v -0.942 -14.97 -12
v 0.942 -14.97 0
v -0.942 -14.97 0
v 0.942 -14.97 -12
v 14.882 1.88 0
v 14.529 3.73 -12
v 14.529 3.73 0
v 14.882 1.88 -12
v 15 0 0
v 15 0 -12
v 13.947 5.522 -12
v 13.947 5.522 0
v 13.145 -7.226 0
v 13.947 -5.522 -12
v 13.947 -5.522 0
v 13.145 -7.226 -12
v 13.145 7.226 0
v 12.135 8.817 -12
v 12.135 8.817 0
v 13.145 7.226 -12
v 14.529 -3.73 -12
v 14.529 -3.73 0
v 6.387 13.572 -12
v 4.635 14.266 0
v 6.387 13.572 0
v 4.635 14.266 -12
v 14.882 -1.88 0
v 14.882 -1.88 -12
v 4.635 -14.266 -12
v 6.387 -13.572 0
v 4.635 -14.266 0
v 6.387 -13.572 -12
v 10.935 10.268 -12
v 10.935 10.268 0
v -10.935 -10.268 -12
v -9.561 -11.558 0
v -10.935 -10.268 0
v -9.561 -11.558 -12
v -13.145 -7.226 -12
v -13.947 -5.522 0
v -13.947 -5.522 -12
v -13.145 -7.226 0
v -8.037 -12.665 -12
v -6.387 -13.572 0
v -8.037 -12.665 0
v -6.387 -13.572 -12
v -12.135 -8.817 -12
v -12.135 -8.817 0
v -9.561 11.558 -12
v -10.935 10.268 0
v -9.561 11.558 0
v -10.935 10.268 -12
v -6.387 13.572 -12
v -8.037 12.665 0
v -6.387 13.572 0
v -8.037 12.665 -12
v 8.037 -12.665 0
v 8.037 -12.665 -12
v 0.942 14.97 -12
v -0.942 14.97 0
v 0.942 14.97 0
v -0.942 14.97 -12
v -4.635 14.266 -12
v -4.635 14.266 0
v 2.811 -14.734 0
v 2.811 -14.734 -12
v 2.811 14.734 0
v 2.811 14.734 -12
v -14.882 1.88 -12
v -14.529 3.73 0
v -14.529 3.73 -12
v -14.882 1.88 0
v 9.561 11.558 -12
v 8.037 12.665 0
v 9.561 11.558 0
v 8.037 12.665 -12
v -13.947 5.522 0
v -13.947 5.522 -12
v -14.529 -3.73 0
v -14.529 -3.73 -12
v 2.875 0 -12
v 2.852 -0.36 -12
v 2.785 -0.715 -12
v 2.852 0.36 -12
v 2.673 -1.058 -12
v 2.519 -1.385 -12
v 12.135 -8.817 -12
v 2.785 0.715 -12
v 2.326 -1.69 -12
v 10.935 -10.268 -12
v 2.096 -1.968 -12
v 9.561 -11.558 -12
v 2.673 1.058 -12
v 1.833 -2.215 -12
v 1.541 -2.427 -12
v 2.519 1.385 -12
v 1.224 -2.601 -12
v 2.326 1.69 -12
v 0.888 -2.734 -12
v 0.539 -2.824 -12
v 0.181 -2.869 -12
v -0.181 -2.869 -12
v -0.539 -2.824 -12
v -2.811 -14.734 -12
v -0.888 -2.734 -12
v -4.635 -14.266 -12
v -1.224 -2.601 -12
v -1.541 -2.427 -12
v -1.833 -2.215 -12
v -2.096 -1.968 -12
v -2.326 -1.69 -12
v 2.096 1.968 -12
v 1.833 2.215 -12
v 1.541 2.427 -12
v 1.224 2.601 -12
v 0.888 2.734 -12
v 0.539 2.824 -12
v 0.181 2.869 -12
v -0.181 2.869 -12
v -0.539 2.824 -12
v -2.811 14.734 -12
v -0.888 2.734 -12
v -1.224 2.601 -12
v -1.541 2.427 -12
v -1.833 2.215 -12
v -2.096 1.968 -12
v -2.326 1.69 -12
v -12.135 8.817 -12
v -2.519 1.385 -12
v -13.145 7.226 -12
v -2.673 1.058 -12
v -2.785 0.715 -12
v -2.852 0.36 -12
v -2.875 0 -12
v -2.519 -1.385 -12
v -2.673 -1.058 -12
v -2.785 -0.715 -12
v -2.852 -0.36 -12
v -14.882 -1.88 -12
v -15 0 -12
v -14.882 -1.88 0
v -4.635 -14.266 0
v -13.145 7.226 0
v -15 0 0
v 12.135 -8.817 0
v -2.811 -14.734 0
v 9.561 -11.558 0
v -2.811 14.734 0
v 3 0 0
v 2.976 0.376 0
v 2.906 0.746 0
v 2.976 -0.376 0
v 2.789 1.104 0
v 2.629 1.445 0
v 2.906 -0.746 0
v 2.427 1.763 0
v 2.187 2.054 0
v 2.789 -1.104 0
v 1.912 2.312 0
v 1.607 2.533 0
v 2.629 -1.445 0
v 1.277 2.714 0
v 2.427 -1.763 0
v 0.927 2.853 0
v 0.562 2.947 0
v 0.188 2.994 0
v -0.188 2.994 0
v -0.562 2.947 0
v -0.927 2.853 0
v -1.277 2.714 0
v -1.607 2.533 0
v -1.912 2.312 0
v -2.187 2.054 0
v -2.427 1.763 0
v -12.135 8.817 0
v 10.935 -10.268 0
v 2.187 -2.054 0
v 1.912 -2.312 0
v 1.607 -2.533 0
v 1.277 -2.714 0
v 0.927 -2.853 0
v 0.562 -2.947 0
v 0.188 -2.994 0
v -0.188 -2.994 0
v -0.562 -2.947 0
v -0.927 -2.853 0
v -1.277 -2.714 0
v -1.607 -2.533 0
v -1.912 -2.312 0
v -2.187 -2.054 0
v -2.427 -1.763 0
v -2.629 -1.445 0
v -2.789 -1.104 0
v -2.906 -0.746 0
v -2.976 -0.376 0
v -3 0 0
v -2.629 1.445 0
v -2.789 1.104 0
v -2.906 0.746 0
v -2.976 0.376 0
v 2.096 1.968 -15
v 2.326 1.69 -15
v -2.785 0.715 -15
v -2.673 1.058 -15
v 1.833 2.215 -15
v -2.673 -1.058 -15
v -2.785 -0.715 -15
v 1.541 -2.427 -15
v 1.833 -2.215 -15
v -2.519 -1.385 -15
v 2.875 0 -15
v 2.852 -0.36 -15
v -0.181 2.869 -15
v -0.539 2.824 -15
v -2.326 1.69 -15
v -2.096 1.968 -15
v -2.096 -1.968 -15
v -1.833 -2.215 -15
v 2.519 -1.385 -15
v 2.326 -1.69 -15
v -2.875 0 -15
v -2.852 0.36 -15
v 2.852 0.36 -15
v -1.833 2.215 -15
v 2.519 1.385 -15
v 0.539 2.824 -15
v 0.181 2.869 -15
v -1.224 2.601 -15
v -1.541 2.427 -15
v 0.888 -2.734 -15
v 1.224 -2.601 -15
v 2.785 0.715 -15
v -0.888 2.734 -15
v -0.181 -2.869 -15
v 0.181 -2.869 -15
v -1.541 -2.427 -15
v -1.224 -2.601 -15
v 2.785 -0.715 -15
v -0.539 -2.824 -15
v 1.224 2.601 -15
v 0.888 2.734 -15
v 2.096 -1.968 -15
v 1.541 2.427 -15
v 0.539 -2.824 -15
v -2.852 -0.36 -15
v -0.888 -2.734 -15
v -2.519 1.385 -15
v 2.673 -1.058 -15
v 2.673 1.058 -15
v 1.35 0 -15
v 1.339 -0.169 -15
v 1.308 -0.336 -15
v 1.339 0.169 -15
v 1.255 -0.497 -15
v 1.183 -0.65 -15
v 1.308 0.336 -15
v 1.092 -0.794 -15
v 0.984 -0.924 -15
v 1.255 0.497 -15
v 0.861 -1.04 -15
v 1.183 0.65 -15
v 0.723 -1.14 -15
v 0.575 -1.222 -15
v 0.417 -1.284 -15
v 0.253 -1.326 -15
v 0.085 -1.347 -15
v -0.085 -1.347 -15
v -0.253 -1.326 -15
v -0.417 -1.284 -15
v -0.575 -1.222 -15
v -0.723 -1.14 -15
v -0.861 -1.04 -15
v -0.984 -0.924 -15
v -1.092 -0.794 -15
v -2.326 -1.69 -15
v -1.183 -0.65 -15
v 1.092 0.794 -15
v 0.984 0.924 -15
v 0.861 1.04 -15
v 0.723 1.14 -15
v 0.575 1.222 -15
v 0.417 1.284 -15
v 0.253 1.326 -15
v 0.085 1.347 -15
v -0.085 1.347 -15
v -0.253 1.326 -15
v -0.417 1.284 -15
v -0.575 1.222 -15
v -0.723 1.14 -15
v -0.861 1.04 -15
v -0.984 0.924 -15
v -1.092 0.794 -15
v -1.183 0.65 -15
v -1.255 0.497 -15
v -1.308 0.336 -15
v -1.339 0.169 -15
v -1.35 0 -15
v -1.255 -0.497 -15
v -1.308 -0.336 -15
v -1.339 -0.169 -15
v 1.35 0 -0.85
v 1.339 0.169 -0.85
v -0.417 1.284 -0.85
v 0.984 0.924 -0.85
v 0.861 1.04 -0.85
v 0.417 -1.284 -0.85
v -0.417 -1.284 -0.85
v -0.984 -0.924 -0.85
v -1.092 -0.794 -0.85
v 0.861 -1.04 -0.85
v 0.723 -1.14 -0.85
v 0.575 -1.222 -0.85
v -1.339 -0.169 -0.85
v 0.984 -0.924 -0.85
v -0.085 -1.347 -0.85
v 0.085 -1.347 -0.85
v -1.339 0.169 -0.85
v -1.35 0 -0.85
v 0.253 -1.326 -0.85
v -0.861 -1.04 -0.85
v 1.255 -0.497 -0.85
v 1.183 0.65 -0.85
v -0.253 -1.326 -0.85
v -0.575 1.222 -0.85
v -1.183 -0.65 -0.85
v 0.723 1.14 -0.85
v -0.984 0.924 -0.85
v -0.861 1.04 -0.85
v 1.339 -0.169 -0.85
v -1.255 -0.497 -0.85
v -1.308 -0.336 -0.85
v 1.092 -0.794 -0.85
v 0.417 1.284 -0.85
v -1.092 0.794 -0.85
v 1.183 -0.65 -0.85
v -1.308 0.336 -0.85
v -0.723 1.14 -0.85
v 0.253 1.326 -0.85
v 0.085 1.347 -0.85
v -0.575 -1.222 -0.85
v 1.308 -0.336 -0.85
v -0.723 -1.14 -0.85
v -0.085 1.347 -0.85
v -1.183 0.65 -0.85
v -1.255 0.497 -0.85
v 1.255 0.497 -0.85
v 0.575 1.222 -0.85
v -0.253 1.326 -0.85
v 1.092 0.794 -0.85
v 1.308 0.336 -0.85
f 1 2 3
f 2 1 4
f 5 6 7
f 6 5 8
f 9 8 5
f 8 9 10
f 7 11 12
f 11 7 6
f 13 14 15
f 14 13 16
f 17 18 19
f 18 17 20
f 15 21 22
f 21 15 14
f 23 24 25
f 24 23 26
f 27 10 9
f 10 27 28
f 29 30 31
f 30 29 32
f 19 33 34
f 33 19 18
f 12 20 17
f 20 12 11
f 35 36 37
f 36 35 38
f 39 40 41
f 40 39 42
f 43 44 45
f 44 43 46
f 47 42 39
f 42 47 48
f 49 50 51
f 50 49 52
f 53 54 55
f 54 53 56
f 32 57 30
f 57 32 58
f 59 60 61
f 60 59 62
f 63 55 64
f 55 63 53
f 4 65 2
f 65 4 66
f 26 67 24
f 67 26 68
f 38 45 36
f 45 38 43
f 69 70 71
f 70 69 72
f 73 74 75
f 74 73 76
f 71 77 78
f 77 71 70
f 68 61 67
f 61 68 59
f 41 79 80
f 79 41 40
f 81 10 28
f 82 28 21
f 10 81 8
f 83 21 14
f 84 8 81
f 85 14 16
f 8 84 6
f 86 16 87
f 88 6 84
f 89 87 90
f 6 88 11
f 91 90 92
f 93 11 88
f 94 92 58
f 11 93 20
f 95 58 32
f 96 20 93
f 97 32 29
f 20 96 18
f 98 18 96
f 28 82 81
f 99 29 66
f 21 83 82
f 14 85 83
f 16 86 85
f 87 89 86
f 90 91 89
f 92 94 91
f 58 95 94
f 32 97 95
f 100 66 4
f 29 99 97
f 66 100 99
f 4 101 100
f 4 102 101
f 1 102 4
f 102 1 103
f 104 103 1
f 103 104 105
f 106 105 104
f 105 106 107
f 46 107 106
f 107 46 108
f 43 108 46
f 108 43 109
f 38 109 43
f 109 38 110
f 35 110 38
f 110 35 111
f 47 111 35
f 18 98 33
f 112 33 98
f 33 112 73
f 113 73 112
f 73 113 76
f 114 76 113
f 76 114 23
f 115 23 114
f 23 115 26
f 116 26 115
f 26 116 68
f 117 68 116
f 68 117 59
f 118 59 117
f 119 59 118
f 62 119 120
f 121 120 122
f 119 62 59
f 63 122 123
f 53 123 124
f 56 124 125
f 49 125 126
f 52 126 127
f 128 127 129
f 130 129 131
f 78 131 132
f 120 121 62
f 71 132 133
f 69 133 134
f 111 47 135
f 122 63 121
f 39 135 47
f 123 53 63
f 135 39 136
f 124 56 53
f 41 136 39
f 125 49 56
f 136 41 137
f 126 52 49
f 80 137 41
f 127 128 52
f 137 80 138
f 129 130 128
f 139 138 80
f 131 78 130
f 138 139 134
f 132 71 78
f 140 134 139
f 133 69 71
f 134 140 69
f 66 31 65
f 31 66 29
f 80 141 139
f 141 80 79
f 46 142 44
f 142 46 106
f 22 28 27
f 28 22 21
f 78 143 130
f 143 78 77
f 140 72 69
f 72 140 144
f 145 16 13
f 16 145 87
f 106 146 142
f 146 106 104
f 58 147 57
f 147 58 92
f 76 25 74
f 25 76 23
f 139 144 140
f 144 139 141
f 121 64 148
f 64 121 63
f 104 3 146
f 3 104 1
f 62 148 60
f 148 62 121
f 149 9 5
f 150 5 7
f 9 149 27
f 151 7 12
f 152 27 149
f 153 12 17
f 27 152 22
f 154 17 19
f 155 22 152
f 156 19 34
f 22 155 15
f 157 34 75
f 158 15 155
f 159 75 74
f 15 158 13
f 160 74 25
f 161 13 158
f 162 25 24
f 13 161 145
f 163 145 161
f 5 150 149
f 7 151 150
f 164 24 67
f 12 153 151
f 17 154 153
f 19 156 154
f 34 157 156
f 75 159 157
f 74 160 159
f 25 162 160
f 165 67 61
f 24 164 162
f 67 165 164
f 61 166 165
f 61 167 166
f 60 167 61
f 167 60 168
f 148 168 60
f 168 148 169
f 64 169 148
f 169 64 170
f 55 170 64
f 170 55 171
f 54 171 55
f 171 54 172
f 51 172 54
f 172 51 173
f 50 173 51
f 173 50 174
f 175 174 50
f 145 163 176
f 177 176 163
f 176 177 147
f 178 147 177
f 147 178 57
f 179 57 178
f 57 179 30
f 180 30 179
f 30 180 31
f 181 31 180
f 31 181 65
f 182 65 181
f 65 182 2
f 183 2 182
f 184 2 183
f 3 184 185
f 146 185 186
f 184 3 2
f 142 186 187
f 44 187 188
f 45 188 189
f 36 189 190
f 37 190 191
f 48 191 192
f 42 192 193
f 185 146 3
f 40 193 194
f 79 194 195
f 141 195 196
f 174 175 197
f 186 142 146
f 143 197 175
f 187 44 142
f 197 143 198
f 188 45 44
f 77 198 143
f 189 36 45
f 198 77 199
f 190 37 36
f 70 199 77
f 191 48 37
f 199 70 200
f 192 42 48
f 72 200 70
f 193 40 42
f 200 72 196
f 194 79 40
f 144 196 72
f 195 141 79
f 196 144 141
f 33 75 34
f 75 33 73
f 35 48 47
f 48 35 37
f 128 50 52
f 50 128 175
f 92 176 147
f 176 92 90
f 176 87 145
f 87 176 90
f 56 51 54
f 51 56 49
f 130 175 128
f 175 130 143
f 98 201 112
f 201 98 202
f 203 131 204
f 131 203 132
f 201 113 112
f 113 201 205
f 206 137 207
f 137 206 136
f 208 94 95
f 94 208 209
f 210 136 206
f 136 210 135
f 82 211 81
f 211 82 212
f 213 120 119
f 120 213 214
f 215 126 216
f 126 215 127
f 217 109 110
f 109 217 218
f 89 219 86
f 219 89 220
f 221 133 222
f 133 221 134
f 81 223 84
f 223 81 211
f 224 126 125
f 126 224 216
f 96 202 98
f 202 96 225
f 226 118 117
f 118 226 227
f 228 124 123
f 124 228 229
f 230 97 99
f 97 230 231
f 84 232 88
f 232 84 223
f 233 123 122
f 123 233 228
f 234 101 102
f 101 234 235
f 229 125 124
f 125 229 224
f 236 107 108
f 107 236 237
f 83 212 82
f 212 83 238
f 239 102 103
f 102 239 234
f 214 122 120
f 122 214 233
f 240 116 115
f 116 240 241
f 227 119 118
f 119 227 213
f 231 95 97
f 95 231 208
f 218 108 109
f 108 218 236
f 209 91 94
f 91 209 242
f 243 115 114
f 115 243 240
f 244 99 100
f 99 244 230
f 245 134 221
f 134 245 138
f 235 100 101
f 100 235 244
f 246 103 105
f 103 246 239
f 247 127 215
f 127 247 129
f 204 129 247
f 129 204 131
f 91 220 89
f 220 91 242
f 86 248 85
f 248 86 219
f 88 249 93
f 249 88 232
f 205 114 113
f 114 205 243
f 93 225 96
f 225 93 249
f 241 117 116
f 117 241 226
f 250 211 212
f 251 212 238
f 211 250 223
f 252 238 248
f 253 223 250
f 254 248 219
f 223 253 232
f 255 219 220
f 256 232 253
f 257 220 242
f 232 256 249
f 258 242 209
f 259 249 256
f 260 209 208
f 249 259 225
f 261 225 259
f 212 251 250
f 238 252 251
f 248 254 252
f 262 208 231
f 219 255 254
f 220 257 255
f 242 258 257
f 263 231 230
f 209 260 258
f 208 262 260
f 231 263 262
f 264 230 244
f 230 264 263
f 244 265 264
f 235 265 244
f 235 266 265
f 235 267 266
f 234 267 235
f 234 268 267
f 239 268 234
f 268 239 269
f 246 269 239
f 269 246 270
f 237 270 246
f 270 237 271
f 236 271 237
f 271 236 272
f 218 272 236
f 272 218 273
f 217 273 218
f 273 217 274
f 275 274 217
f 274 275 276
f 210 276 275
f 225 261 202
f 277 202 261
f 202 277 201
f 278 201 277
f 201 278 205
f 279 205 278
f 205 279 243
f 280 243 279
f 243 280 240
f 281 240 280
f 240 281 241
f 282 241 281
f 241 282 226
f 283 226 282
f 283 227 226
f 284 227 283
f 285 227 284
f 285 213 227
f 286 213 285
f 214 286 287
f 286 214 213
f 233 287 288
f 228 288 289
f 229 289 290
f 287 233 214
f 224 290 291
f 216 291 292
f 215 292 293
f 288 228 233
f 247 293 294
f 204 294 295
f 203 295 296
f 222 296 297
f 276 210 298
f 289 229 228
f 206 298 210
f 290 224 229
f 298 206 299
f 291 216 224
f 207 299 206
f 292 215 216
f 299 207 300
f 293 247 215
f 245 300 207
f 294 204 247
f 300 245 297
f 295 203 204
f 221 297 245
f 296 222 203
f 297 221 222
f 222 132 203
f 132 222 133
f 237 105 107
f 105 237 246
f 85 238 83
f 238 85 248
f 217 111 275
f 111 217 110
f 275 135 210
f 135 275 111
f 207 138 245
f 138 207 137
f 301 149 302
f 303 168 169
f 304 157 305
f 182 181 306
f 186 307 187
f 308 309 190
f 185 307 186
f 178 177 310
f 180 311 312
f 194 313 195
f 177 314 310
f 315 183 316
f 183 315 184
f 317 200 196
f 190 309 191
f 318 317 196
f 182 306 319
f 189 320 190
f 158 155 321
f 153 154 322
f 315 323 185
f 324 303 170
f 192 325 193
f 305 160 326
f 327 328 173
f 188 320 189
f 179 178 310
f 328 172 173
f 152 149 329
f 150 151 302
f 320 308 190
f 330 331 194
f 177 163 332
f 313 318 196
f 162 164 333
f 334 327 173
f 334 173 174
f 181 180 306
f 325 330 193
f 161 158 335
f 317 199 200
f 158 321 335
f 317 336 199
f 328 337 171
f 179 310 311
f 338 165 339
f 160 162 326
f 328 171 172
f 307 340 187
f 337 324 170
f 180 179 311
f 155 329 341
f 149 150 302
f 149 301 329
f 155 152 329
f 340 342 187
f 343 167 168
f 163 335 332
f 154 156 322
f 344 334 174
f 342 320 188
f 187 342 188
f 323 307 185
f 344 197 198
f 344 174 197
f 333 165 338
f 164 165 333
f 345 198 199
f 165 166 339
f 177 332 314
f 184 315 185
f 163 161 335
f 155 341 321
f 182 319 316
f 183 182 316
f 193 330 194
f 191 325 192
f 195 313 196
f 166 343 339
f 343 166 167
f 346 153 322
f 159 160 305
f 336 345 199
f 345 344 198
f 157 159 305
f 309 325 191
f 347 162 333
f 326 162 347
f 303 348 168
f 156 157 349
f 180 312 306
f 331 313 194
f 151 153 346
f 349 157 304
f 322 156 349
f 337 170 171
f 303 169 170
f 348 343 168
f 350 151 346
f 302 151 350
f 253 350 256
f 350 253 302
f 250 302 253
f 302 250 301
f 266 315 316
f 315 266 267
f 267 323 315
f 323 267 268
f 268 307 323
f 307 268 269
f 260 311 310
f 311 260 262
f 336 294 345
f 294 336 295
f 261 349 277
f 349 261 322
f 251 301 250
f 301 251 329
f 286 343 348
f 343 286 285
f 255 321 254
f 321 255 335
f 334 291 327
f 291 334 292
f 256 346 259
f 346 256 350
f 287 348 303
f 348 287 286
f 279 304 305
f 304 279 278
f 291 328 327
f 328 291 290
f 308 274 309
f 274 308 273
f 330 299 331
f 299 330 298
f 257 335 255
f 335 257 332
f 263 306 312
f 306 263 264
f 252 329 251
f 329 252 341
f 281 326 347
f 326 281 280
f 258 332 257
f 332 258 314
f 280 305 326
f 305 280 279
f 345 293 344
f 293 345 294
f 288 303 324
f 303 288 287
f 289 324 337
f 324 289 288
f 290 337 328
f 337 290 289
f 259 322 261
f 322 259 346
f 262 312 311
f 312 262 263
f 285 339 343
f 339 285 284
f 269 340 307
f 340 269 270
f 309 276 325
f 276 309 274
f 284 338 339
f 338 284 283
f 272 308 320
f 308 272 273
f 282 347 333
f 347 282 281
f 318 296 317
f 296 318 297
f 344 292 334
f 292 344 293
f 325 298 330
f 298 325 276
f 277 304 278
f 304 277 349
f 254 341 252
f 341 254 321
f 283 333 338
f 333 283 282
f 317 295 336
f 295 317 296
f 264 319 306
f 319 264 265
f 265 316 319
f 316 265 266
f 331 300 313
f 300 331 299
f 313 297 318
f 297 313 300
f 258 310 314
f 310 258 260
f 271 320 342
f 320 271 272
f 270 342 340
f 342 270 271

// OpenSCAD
$fn = 50;

difference() {
	union() {
		translate(v = [0, 0, -12.0]) {
			cylinder(h = 12, r = 15.0);
		}
		#translate(v = [0, 0, -15.0]) {
			cylinder(h = 15, r = 2.875);
		}
	}
	union() {
		translate(v = [0, 0, 0]) {
			rotate(a = [0, 0, 0]) {
				difference() {
					union() {
						translate(v = [0, 0, -15.0]) {
							cylinder(h = 15, r = 1.0);
						}
						translate(v = [0, 0, -0.85]) {
							cylinder(h = 0.85, r1 = 1.35, r2 = 3.0);
						}
						translate(v = [0, 0, -15.0]) {
							cylinder(h = 15, r = 1.35);
						}
						translate(v = [0, 0, -15.0]) {
							cylinder(h = 15, r = 1.0);
						}
					}
					union();
				}
			}
		}
	}
}
